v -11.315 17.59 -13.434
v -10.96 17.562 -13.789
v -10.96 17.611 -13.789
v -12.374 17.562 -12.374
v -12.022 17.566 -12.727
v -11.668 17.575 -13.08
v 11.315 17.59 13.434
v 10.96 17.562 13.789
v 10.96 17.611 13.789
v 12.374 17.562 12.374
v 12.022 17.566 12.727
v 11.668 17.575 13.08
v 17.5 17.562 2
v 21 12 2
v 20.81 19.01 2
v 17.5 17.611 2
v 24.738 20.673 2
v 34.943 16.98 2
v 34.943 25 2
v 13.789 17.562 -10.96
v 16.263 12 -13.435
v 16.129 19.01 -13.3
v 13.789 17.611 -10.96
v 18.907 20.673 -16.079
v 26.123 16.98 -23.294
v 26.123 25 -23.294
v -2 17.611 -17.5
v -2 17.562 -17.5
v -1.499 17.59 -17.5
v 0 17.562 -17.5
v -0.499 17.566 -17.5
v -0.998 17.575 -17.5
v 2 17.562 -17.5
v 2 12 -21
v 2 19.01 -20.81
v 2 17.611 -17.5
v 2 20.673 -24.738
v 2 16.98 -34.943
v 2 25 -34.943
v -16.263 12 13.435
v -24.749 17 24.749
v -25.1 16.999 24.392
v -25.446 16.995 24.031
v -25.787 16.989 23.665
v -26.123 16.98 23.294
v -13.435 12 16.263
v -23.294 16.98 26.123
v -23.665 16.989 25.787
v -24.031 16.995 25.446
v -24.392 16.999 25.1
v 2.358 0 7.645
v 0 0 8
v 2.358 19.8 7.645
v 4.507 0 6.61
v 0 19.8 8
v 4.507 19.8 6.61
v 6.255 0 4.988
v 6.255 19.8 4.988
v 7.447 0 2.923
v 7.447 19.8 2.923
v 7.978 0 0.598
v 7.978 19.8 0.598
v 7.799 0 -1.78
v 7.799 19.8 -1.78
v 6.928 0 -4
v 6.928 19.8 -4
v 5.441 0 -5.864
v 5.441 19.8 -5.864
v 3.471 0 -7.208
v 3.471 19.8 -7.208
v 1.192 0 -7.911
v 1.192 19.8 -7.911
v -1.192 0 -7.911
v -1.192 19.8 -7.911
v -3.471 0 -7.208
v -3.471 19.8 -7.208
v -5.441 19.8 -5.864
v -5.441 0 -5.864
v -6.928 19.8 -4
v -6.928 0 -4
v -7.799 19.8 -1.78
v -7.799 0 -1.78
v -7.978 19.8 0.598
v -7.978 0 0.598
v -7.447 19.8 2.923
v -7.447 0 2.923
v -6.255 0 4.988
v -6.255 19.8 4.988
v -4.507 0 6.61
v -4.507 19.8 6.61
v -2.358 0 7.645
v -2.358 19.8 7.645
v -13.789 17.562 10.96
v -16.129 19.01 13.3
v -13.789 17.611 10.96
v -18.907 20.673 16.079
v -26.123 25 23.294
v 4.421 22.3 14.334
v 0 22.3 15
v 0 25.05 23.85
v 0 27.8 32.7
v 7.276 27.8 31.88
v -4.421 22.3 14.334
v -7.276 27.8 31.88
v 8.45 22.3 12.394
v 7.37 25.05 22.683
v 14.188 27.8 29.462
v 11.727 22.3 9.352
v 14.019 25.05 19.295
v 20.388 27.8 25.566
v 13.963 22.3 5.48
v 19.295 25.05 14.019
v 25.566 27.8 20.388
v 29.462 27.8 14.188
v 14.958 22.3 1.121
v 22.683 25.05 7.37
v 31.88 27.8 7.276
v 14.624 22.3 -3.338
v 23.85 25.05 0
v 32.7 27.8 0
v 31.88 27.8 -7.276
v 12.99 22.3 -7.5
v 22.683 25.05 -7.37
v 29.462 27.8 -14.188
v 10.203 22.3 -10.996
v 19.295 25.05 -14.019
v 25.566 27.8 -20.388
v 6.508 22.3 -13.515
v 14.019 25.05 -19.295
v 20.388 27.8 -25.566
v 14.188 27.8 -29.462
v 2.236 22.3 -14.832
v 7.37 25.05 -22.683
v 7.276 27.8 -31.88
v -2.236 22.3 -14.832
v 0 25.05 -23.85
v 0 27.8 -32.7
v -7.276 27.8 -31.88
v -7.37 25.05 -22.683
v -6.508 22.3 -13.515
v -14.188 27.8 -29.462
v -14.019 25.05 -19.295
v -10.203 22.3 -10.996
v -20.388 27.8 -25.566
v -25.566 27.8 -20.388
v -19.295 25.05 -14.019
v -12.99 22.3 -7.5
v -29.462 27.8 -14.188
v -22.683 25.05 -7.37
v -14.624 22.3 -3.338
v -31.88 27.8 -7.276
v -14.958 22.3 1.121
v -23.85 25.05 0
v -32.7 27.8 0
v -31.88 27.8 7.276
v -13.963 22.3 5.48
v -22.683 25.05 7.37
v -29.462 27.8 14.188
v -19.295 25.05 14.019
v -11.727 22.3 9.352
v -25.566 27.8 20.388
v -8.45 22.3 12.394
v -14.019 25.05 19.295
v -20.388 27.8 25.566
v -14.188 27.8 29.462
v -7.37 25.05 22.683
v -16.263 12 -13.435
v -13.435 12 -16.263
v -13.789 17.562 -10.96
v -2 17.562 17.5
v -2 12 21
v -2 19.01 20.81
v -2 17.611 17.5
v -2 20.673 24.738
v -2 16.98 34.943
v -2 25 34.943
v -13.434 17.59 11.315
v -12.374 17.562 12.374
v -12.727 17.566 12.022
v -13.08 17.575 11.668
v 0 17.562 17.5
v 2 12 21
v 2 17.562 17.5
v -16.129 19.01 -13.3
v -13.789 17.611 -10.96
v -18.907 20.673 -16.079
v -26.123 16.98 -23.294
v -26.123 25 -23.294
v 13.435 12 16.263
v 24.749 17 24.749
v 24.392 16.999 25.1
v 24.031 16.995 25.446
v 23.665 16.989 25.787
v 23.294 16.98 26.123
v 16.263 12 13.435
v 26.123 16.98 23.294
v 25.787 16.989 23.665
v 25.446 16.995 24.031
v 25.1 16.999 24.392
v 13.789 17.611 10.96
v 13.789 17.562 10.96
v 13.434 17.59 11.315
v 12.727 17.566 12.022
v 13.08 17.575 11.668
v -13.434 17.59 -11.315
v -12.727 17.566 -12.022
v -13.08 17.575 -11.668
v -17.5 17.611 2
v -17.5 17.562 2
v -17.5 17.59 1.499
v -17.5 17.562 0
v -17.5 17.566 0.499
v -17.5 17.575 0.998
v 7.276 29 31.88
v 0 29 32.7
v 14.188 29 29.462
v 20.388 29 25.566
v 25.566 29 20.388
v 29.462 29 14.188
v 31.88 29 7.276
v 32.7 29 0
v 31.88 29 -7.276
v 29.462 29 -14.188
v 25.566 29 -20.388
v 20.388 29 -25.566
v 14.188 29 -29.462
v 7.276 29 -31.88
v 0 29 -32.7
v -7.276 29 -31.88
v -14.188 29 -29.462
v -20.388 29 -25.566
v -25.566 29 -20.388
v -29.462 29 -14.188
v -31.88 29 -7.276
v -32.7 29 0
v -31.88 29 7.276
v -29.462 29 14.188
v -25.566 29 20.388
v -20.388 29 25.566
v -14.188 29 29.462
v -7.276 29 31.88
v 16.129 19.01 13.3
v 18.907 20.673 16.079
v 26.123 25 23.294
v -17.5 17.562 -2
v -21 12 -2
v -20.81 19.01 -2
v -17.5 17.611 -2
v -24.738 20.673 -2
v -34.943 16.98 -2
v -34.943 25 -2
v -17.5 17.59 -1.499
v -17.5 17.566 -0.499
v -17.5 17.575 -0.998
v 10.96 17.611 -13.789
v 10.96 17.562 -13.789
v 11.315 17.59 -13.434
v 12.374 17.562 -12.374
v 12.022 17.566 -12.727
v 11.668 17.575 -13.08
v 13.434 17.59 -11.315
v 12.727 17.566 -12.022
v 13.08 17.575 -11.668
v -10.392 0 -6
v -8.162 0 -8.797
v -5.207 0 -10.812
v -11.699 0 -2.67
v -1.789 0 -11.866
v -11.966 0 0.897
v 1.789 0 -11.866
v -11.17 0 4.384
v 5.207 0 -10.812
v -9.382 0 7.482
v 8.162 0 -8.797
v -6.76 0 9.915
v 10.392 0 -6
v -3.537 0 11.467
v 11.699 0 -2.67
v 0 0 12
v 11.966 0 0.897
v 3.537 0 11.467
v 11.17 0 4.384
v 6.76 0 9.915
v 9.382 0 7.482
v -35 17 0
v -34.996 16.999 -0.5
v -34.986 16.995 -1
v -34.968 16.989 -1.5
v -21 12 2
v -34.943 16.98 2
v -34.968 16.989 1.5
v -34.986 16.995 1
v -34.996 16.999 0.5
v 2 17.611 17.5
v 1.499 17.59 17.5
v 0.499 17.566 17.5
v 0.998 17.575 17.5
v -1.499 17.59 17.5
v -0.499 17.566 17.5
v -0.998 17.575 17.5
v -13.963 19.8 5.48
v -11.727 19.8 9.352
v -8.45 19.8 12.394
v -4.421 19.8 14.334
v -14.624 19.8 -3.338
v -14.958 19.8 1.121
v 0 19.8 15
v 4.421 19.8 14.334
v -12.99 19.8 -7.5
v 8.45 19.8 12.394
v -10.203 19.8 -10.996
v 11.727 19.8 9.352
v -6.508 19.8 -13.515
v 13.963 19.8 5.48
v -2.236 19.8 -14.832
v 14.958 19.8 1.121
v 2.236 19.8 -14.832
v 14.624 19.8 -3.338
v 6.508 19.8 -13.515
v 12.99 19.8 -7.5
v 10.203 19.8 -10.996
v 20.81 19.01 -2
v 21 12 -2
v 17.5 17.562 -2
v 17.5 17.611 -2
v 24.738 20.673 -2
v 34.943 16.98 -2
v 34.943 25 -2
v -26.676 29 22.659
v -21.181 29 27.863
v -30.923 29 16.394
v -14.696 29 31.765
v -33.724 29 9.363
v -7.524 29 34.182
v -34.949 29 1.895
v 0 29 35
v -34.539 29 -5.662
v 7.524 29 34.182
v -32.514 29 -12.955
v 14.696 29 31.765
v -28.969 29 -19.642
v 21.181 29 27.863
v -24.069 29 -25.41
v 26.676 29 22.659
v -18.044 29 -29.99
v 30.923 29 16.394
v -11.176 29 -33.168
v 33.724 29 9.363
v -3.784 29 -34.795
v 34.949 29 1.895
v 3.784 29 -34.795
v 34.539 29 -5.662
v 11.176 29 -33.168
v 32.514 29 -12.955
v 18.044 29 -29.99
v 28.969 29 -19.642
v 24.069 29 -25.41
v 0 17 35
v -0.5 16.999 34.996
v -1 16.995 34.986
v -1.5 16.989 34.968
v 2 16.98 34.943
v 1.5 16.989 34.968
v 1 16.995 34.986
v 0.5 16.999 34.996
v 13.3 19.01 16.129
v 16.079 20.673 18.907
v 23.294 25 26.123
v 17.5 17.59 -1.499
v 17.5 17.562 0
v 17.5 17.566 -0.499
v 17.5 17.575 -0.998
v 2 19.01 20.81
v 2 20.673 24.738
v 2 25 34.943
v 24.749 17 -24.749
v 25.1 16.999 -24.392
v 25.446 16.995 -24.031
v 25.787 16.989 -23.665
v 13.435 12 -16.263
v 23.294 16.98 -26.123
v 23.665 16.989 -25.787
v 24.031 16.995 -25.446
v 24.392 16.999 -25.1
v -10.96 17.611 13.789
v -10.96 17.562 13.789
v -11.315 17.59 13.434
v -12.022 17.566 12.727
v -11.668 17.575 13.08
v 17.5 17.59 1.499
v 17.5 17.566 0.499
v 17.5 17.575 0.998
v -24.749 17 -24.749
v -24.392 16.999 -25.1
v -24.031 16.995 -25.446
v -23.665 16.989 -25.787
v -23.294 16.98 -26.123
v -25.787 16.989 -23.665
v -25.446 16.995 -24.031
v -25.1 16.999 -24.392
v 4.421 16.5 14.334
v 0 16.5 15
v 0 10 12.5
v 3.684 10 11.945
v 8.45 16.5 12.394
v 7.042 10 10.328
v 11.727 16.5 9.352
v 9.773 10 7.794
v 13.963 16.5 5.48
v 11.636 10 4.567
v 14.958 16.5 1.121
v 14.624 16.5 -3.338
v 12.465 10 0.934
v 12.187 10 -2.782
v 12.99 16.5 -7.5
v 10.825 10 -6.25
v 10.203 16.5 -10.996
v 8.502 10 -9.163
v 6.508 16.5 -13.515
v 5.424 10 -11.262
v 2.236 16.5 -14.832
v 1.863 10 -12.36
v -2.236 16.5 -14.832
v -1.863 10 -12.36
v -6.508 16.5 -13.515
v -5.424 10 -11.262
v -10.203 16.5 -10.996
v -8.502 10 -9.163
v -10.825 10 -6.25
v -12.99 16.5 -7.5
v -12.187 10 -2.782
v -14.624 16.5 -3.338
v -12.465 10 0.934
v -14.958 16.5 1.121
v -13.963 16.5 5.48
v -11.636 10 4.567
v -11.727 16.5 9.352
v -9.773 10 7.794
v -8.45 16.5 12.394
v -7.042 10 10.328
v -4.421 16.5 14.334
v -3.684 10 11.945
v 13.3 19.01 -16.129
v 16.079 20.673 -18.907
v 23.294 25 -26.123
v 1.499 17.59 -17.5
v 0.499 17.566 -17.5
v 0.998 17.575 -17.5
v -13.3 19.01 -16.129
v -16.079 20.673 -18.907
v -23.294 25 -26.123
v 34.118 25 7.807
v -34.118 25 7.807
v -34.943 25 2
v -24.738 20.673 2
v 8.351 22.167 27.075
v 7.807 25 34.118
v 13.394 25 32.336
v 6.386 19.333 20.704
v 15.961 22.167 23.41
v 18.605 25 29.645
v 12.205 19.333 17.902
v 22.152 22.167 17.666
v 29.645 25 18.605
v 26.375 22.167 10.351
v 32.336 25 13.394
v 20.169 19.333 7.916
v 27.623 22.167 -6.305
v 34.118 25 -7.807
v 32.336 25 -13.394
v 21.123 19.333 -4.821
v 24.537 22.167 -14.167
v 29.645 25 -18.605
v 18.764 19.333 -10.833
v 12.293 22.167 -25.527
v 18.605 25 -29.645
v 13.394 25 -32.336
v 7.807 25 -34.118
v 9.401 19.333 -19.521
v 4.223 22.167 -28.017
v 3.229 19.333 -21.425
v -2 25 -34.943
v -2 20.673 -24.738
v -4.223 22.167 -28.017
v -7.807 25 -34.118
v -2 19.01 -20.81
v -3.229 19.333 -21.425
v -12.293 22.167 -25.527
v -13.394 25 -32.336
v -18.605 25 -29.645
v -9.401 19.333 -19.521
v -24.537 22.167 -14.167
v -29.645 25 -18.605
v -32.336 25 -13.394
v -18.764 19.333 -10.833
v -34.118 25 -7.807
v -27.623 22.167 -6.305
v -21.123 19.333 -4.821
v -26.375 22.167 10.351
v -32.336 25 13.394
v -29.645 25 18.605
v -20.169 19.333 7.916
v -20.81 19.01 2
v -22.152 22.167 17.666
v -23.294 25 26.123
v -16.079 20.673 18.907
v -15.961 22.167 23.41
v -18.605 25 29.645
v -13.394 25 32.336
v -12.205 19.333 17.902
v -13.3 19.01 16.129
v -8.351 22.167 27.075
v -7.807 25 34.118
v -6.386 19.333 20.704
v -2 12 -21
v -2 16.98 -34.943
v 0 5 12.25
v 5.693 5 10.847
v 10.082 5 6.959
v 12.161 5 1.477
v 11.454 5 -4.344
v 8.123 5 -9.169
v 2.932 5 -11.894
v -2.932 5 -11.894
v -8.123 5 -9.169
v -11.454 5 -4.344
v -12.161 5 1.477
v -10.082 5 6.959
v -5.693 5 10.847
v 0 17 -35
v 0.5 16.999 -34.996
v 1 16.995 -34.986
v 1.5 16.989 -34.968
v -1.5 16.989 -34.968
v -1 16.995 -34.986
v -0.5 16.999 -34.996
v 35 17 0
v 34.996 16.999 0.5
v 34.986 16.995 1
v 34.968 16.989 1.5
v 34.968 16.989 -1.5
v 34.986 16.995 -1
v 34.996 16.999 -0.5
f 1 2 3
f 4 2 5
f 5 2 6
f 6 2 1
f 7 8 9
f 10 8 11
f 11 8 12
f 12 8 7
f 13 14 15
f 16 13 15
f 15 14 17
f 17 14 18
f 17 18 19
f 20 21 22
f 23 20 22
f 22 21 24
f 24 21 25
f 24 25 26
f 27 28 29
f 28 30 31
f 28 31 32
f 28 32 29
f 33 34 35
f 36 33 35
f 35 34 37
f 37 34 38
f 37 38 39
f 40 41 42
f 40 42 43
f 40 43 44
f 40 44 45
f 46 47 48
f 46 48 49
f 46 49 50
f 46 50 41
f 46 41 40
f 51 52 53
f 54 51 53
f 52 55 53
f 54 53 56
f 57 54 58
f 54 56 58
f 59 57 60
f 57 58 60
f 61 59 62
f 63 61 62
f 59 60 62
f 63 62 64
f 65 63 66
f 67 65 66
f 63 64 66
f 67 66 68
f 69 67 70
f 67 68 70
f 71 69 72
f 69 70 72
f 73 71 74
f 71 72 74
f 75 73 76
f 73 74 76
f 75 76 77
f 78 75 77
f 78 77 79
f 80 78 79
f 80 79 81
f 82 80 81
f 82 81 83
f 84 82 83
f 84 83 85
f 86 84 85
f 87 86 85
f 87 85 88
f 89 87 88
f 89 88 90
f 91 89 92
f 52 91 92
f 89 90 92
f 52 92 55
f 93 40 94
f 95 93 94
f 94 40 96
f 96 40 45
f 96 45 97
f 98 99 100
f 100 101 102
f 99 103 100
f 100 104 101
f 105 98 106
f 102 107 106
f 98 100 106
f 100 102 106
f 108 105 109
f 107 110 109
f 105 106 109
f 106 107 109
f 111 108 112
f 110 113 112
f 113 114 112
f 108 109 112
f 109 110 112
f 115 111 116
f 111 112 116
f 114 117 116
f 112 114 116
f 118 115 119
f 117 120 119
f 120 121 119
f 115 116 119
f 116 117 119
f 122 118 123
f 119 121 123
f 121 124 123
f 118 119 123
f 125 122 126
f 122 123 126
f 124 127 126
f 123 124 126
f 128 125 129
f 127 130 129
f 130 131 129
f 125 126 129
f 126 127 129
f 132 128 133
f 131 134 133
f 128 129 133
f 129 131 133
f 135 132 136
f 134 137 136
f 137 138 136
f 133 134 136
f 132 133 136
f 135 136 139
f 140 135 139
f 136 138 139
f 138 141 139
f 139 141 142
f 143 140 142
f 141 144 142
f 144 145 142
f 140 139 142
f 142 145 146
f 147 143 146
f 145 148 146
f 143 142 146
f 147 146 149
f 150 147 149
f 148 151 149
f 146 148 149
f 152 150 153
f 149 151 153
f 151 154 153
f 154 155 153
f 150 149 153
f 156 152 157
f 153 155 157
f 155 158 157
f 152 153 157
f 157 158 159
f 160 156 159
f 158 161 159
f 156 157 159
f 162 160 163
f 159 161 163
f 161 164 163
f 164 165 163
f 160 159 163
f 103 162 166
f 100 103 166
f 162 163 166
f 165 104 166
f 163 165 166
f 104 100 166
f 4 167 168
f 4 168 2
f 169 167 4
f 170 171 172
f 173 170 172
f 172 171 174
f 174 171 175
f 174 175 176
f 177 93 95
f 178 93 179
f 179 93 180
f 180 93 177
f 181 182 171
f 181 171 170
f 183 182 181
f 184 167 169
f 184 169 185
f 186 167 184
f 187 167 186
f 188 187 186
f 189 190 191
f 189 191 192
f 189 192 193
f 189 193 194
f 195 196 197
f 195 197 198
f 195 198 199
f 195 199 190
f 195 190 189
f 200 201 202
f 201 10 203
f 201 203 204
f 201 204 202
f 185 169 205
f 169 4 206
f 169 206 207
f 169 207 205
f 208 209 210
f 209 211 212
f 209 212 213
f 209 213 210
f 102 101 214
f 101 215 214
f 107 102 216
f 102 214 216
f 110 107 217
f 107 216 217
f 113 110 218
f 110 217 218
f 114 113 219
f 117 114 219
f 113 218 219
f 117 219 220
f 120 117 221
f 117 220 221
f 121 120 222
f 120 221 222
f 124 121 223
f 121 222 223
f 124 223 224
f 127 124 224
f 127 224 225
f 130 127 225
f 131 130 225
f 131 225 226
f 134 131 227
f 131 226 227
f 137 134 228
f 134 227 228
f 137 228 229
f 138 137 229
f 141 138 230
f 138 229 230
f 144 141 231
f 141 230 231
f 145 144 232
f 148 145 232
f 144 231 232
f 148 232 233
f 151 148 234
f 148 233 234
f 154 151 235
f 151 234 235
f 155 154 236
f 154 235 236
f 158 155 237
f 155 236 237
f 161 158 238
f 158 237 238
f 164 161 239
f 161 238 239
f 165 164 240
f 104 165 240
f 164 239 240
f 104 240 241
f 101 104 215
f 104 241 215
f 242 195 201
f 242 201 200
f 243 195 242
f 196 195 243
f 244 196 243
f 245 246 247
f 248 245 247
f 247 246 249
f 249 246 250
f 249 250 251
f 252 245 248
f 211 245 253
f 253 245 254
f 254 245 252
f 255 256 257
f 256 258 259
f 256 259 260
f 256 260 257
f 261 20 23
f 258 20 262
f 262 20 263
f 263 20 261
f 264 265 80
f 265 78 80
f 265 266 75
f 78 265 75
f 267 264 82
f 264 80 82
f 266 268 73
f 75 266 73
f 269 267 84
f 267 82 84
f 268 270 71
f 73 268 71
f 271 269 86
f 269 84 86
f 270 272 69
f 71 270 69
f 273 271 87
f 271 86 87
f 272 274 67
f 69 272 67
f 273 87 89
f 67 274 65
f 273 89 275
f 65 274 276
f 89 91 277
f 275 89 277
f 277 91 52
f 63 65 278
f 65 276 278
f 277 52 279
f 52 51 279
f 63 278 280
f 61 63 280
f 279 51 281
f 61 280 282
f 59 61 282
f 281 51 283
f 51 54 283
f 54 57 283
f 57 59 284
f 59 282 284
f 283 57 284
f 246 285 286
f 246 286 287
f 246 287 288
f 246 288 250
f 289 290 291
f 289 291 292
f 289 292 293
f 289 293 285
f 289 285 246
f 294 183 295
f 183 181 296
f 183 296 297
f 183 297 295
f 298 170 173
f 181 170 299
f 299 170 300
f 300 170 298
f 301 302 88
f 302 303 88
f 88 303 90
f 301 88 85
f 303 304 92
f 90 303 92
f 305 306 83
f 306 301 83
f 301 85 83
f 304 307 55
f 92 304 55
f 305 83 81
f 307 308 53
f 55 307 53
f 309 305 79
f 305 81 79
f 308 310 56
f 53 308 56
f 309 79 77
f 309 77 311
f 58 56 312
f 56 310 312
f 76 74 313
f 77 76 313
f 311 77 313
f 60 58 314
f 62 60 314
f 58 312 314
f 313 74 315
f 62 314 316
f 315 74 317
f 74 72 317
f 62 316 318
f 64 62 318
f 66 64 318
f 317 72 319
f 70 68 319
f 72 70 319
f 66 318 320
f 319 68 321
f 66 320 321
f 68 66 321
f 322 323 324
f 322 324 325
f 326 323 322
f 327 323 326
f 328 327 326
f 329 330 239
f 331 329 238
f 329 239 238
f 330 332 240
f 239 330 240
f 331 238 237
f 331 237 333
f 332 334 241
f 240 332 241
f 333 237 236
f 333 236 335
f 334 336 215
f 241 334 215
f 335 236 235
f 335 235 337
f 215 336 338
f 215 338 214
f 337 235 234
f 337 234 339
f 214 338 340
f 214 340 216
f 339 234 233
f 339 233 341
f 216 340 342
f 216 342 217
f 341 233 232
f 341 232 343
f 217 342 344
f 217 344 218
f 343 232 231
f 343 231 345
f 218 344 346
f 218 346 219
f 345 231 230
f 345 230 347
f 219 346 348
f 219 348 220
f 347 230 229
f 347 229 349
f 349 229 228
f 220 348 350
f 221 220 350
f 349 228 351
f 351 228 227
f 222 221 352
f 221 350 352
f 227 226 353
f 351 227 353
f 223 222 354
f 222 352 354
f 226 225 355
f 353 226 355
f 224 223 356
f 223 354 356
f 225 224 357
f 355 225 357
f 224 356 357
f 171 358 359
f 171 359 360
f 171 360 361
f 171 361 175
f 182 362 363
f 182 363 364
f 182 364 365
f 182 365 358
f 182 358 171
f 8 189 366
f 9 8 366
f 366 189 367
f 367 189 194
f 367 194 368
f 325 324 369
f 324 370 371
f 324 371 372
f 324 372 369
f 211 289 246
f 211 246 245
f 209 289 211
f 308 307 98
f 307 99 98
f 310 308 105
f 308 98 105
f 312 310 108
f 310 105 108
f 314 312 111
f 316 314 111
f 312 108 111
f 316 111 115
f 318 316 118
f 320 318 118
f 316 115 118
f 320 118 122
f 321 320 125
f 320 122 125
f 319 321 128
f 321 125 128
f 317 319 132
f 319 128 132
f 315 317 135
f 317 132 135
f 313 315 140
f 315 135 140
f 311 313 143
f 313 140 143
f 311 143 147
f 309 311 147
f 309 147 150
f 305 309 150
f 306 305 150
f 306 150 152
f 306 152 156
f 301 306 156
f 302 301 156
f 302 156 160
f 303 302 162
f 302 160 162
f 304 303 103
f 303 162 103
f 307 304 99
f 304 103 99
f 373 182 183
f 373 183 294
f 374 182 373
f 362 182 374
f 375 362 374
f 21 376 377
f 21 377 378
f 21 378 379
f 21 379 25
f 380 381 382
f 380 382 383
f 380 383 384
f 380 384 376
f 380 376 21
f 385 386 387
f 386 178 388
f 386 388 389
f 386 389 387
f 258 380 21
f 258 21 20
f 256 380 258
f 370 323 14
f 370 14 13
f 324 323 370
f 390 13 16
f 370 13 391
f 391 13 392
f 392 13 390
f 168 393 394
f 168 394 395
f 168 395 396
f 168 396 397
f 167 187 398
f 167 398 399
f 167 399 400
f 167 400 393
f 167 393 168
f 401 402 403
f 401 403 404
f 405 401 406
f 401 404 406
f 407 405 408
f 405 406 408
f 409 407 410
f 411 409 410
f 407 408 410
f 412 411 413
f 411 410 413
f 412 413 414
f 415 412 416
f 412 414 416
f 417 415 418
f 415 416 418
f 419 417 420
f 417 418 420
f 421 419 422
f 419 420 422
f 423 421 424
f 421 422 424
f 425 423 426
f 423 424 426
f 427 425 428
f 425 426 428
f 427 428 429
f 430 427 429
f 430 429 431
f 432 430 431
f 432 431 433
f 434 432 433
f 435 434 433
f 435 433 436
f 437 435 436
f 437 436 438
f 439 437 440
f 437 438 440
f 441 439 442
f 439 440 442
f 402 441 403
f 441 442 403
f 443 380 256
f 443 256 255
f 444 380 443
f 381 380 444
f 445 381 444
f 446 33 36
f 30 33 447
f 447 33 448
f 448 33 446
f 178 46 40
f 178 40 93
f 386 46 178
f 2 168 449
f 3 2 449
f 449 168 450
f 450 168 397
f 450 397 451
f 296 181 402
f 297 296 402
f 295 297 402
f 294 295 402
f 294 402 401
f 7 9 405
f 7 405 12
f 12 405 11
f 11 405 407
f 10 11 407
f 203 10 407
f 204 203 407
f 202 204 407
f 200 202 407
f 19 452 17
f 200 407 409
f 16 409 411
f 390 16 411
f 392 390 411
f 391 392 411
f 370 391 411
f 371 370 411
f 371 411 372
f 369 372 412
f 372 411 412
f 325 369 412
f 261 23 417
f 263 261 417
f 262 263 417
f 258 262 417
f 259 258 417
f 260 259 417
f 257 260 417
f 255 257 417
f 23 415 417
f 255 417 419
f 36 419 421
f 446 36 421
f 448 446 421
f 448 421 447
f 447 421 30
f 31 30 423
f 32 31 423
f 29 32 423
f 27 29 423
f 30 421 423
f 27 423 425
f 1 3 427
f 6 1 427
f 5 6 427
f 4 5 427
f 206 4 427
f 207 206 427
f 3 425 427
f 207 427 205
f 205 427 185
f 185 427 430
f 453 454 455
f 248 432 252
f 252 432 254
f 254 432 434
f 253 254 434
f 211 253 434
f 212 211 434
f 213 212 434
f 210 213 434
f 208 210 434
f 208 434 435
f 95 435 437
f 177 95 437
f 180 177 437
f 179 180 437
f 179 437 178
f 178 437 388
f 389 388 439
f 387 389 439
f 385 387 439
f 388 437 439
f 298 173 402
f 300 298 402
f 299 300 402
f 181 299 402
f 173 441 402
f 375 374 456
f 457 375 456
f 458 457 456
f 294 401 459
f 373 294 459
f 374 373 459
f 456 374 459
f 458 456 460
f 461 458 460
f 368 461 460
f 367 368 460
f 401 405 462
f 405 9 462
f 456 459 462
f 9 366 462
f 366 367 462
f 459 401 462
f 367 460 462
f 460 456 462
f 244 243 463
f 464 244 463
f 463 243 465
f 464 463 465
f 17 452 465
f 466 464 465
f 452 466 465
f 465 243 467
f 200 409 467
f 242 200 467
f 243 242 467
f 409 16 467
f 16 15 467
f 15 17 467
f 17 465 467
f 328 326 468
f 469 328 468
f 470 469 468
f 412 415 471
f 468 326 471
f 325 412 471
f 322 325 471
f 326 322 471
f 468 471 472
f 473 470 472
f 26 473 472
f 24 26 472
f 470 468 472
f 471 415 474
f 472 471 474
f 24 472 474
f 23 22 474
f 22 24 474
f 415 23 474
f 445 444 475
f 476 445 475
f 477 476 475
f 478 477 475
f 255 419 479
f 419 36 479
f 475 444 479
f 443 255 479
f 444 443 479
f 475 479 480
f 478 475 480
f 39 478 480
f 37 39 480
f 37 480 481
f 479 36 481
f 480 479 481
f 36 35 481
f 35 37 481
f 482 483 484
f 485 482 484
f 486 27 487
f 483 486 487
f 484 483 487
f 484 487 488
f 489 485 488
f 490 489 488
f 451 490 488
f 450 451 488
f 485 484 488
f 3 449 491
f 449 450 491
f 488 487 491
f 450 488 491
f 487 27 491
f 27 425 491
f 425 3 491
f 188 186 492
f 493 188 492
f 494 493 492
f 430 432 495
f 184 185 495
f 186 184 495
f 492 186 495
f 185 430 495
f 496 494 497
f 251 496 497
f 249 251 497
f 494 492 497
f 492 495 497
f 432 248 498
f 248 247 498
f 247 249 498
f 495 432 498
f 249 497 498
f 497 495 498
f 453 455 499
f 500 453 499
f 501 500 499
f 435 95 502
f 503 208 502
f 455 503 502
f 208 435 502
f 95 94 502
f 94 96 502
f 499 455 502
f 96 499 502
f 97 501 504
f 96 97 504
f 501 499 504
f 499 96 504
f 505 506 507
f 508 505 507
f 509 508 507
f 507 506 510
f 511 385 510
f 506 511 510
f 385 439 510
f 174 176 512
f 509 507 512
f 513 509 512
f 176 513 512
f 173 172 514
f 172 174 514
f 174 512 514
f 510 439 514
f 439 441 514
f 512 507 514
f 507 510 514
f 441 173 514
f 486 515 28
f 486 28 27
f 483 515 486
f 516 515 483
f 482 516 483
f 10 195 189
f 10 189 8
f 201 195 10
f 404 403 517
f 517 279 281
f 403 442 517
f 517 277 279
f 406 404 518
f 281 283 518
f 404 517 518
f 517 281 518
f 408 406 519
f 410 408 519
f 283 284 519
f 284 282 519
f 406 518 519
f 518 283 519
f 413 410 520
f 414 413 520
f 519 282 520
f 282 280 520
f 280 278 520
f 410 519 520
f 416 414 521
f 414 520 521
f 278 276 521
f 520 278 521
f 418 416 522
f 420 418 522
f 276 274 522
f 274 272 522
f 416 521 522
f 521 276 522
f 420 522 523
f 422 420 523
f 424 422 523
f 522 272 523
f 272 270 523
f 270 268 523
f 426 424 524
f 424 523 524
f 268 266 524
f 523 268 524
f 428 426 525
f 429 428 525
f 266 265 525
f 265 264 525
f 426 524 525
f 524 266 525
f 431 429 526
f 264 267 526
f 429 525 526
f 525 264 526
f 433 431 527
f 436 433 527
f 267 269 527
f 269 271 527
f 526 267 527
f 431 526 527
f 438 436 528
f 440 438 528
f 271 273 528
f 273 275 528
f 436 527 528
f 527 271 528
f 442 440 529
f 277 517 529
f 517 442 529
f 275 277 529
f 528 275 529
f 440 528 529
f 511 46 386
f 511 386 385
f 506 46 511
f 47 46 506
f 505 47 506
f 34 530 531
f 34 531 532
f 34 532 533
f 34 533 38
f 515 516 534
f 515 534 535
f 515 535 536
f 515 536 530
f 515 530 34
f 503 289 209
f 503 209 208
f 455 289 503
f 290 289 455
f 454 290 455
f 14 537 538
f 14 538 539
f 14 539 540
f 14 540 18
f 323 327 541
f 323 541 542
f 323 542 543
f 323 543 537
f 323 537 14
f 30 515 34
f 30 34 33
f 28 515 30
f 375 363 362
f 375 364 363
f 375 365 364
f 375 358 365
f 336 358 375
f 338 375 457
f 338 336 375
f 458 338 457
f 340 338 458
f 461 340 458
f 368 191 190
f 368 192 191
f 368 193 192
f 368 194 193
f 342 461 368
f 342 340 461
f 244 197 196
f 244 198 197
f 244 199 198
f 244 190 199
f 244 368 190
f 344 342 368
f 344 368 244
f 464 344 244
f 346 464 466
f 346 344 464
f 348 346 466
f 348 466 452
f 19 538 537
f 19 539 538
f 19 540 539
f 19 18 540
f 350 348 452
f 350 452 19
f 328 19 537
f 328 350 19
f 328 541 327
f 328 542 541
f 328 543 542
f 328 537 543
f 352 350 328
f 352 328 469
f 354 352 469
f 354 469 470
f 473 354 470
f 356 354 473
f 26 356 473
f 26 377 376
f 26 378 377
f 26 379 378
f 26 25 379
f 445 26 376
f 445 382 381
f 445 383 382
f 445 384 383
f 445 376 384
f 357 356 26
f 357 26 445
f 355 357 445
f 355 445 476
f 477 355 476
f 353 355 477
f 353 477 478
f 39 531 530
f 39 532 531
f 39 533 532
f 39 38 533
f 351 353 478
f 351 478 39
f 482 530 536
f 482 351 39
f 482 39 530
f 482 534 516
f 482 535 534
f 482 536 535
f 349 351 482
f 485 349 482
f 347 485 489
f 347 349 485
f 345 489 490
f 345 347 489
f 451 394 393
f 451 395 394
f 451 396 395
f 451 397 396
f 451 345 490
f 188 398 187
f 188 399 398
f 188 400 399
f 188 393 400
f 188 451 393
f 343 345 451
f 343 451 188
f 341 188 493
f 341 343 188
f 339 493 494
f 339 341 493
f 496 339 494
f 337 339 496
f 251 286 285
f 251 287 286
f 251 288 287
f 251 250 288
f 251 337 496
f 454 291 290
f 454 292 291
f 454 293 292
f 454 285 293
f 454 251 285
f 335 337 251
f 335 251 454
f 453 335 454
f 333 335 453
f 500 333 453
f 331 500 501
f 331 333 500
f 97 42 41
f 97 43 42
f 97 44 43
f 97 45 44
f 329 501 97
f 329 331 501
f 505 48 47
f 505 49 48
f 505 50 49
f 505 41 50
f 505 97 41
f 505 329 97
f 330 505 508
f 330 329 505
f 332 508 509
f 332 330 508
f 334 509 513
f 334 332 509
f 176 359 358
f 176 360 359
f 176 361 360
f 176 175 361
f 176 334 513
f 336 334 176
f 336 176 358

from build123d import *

# Parameters (mm, degrees)
F3_DEPTH        = 2
F3_COPIES_COUNT = 8
F4_W            = 13
F4_H            = 2


# Not quite as in the source:
# - a pattern or mirror of a feature is missing from the dataset's text; its kind, count and spacing are read off the source's solid


with BuildPart() as f1:
    # F0 (on Right) → F1 (revolve)
    with BuildSketch(Plane.YZ):
        Polygon((0, 12), (0, 8), (19.8, 8), (19.8, 15), (22.3, 15), (27.8, 32.7), (29, 32.7), (29, 35), (25, 35), (16.5, 15), (10, 12.5), align=None)
    revolve(axis=Axis((0, 14.5, 0), (0, 1, 0)))

    # F2 (on Right) → F3 (join, symmetric)
    with BuildSketch(Plane.YZ):
        Polygon((27, 35), (25, 35), (17, 35), (12, 21), (17.5625, 17.5), (19.5625, 17.5), align=None)
    f3 = extrude(amount=F3_DEPTH, both=True)

    # F3_copies: F3 ×8 about axis
    f3_copies_axis = Axis((0, 0, 0), (0, 1, 0))
    for i in range(1, F3_COPIES_COUNT):
        add(f3.rotate(f3_copies_axis, i * 360 / F3_COPIES_COUNT))

    # F4 (on Right) → F5 (revolve, cut)
    with BuildSketch(Plane.YZ):
        with Locations((22.5, 36)):
            Rectangle(F4_W, F4_H)
    revolve(axis=Axis((0, 14.5, 0), (0, 1, 0)), mode=Mode.SUBTRACT)


solid = f1.part
